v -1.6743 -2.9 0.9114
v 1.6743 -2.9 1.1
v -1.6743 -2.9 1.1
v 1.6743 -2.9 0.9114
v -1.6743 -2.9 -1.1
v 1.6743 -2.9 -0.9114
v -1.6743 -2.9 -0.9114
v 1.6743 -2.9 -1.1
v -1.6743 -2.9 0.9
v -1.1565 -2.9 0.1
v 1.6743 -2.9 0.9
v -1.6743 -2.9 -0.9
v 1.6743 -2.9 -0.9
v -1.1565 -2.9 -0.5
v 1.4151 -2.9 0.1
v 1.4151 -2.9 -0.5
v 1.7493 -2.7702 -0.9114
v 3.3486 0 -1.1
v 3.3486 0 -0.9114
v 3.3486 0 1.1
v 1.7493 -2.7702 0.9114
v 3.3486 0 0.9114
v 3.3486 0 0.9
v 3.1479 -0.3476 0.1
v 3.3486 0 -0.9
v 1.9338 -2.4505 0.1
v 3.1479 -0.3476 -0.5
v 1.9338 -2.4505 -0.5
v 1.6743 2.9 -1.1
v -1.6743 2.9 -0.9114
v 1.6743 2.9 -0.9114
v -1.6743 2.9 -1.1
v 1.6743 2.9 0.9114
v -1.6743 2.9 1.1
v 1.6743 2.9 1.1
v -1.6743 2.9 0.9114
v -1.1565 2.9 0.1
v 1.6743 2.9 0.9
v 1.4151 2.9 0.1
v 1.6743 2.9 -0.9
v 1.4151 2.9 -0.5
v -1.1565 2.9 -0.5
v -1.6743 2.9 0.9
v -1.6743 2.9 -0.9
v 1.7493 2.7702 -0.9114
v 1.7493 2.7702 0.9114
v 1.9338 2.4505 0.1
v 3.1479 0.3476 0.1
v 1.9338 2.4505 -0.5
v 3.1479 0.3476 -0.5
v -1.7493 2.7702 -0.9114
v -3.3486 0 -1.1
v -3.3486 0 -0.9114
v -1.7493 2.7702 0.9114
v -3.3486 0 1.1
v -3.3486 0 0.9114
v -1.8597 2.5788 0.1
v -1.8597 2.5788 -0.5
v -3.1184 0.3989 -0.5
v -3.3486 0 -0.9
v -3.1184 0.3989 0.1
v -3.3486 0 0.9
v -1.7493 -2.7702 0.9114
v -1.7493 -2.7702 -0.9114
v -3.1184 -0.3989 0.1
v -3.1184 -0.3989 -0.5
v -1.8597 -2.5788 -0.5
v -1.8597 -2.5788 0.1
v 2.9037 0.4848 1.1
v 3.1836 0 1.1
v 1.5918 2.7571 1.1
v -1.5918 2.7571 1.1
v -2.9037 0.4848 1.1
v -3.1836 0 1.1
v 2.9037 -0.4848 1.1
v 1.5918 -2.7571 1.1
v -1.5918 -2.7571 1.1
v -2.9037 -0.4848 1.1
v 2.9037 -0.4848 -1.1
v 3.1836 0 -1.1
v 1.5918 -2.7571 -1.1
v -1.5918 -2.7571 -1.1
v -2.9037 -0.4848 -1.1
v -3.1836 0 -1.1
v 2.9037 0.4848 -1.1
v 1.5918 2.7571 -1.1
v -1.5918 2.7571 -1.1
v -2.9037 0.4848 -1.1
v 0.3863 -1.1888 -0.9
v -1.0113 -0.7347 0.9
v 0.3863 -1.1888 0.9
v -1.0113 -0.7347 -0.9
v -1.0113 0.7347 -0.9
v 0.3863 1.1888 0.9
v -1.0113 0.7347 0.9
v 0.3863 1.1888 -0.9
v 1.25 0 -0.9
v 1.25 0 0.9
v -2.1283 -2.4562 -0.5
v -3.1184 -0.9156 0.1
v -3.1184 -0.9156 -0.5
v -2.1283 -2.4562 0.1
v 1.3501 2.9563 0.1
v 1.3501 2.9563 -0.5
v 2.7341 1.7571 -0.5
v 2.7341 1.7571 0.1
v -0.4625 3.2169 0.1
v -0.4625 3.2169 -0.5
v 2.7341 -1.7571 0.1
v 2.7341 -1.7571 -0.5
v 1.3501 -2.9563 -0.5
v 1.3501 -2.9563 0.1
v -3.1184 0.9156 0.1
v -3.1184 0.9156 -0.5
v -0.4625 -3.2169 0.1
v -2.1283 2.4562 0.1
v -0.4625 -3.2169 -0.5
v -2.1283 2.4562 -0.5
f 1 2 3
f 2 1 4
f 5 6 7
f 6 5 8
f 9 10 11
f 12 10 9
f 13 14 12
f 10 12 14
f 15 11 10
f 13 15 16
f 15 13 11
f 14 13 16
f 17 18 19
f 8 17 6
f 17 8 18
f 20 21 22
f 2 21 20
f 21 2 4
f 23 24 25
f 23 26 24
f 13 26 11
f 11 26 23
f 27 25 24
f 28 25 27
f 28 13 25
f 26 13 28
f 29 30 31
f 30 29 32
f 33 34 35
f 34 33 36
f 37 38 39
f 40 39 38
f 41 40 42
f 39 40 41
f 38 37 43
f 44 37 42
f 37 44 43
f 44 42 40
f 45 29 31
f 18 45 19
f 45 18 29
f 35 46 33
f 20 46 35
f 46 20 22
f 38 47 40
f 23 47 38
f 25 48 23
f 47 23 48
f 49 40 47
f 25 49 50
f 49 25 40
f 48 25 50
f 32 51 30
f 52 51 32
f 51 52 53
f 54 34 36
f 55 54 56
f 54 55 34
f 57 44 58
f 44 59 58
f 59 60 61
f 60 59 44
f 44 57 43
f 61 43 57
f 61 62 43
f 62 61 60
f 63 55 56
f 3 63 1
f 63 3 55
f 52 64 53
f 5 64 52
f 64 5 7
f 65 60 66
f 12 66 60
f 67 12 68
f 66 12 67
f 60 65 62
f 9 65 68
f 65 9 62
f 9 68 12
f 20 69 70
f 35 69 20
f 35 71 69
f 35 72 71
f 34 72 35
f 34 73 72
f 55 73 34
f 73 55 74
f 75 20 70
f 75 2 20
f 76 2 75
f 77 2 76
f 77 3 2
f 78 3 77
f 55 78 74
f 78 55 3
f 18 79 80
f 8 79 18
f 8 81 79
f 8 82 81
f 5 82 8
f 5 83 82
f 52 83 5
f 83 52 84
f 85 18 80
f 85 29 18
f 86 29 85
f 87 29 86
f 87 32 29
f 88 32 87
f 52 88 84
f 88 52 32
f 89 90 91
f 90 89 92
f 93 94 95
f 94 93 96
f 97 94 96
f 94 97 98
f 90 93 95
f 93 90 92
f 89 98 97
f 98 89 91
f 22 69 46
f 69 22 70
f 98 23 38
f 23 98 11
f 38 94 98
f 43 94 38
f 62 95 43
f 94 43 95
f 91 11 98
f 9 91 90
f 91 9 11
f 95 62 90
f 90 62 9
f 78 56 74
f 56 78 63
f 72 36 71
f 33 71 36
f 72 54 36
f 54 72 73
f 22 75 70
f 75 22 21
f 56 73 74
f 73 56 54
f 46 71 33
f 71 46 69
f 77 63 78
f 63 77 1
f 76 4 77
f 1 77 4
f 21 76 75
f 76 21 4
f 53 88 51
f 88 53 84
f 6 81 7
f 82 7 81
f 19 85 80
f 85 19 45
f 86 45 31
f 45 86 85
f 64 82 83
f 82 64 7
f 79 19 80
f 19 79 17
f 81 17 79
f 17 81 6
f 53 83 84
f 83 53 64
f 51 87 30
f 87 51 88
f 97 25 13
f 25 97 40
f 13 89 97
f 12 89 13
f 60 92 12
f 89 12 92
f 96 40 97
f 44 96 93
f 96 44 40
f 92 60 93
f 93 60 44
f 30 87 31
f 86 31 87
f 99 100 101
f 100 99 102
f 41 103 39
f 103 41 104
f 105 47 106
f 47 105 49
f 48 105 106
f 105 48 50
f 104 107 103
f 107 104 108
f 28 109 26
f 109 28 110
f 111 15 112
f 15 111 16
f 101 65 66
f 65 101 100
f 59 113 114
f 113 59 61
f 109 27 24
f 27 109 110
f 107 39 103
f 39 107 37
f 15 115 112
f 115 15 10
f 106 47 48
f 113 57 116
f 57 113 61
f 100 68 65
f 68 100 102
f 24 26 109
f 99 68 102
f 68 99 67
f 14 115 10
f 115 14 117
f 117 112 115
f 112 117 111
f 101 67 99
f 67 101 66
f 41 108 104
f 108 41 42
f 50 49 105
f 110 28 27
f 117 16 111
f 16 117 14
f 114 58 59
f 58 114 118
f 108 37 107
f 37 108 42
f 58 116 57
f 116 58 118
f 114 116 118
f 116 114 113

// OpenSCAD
// Parameters
thread_nominal_diameter_mm = 2.5; //[1.25:5:0.05]
thread_pitch_mm = 0.45; //[0.2:1:0.01]
across_flats_mm = 5.8; //[2.9:11.6:0.05]
thickness_mm = 2.2; //[1.1:4.4:0.05]
across_corners_mm = 6.697; //[3.3485:13.394:0.05]
outer_circumradius_mm = 3.348; //[1.674:6.696:0.01]
inner_hole_diameter_mm = 2.5; //[1.25:5:0.05]
chamfer_mm = 0.2; //[0.1:0.6:0.05]
tolerance_mm = 0; //[-0.2:0.3:0.01]
eps_mm = 0.02; //[0.01:0.1:0.01]

// Use 1–2mm overlap to guarantee connectivity between stacked parts
overlap_mm = 1.2; //[0.2:2:0.1]

washer_outer_diameter_mm = 6.5; //[3.25:13:0.1]
washer_thickness_mm = 0.6; //[0.3:1.2:0.05]

// Derived
hex_R = (across_flats_mm/2)/cos(30); // circumradius for $fn=6 cylinder

// Hexagonal Nut
module hex_nut() {
  difference() {
    // Single continuous nut body (no stacked/disconnected rings)
    cylinder(h=thickness_mm, r=hex_R, center=true, $fn=6);

    // Central hole (through)
    cylinder(h=thickness_mm + 2*overlap_mm, r=(inner_hole_diameter_mm + tolerance_mm)/2, center=true);

    // Chamfers cut from the same body (keeps one solid, avoids "separated top/bottom")
    // Top chamfer cutter
    translate([0, 0,  thickness_mm/2 - chamfer_mm/2 + eps_mm])
      cylinder(h=chamfer_mm + 2*eps_mm,
               r1=hex_R + 0.01,          // slightly larger to ensure clean cut
               r2=hex_R - chamfer_mm,
               center=true, $fn=6);

    // Bottom chamfer cutter
    translate([0, 0, -thickness_mm/2 + chamfer_mm/2 - eps_mm])
      cylinder(h=chamfer_mm + 2*eps_mm,
               r1=hex_R - chamfer_mm,
               r2=hex_R + 0.01,
               center=true, $fn=6);
  }
}

// Washer (attached to nut with guaranteed overlap)
module washer_attached() {
  // Place washer directly under nut and overlap into nut by overlap_mm
  // Nut bottom is at z = -thickness_mm/2
  // Washer top is at z = z_w + washer_thickness_mm/2
  // Enforce: washer top = nut bottom + overlap_mm  => z_w = -thickness_mm/2 + overlap_mm - washer_thickness_mm/2
  z_w = -thickness_mm/2 + overlap_mm - washer_thickness_mm/2;

  translate([0, 0, z_w])
    difference() {
      cylinder(h=washer_thickness_mm, r=washer_outer_diameter_mm/2, center=true);
      cylinder(h=washer_thickness_mm + 2*overlap_mm, r=(inner_hole_diameter_mm + tolerance_mm)/2, center=true);
    }
}

// Final Assembly: union into a single connected solid
module assembly() {
  union() {
    hex_nut();
    washer_attached();
  }
}

assembly();
